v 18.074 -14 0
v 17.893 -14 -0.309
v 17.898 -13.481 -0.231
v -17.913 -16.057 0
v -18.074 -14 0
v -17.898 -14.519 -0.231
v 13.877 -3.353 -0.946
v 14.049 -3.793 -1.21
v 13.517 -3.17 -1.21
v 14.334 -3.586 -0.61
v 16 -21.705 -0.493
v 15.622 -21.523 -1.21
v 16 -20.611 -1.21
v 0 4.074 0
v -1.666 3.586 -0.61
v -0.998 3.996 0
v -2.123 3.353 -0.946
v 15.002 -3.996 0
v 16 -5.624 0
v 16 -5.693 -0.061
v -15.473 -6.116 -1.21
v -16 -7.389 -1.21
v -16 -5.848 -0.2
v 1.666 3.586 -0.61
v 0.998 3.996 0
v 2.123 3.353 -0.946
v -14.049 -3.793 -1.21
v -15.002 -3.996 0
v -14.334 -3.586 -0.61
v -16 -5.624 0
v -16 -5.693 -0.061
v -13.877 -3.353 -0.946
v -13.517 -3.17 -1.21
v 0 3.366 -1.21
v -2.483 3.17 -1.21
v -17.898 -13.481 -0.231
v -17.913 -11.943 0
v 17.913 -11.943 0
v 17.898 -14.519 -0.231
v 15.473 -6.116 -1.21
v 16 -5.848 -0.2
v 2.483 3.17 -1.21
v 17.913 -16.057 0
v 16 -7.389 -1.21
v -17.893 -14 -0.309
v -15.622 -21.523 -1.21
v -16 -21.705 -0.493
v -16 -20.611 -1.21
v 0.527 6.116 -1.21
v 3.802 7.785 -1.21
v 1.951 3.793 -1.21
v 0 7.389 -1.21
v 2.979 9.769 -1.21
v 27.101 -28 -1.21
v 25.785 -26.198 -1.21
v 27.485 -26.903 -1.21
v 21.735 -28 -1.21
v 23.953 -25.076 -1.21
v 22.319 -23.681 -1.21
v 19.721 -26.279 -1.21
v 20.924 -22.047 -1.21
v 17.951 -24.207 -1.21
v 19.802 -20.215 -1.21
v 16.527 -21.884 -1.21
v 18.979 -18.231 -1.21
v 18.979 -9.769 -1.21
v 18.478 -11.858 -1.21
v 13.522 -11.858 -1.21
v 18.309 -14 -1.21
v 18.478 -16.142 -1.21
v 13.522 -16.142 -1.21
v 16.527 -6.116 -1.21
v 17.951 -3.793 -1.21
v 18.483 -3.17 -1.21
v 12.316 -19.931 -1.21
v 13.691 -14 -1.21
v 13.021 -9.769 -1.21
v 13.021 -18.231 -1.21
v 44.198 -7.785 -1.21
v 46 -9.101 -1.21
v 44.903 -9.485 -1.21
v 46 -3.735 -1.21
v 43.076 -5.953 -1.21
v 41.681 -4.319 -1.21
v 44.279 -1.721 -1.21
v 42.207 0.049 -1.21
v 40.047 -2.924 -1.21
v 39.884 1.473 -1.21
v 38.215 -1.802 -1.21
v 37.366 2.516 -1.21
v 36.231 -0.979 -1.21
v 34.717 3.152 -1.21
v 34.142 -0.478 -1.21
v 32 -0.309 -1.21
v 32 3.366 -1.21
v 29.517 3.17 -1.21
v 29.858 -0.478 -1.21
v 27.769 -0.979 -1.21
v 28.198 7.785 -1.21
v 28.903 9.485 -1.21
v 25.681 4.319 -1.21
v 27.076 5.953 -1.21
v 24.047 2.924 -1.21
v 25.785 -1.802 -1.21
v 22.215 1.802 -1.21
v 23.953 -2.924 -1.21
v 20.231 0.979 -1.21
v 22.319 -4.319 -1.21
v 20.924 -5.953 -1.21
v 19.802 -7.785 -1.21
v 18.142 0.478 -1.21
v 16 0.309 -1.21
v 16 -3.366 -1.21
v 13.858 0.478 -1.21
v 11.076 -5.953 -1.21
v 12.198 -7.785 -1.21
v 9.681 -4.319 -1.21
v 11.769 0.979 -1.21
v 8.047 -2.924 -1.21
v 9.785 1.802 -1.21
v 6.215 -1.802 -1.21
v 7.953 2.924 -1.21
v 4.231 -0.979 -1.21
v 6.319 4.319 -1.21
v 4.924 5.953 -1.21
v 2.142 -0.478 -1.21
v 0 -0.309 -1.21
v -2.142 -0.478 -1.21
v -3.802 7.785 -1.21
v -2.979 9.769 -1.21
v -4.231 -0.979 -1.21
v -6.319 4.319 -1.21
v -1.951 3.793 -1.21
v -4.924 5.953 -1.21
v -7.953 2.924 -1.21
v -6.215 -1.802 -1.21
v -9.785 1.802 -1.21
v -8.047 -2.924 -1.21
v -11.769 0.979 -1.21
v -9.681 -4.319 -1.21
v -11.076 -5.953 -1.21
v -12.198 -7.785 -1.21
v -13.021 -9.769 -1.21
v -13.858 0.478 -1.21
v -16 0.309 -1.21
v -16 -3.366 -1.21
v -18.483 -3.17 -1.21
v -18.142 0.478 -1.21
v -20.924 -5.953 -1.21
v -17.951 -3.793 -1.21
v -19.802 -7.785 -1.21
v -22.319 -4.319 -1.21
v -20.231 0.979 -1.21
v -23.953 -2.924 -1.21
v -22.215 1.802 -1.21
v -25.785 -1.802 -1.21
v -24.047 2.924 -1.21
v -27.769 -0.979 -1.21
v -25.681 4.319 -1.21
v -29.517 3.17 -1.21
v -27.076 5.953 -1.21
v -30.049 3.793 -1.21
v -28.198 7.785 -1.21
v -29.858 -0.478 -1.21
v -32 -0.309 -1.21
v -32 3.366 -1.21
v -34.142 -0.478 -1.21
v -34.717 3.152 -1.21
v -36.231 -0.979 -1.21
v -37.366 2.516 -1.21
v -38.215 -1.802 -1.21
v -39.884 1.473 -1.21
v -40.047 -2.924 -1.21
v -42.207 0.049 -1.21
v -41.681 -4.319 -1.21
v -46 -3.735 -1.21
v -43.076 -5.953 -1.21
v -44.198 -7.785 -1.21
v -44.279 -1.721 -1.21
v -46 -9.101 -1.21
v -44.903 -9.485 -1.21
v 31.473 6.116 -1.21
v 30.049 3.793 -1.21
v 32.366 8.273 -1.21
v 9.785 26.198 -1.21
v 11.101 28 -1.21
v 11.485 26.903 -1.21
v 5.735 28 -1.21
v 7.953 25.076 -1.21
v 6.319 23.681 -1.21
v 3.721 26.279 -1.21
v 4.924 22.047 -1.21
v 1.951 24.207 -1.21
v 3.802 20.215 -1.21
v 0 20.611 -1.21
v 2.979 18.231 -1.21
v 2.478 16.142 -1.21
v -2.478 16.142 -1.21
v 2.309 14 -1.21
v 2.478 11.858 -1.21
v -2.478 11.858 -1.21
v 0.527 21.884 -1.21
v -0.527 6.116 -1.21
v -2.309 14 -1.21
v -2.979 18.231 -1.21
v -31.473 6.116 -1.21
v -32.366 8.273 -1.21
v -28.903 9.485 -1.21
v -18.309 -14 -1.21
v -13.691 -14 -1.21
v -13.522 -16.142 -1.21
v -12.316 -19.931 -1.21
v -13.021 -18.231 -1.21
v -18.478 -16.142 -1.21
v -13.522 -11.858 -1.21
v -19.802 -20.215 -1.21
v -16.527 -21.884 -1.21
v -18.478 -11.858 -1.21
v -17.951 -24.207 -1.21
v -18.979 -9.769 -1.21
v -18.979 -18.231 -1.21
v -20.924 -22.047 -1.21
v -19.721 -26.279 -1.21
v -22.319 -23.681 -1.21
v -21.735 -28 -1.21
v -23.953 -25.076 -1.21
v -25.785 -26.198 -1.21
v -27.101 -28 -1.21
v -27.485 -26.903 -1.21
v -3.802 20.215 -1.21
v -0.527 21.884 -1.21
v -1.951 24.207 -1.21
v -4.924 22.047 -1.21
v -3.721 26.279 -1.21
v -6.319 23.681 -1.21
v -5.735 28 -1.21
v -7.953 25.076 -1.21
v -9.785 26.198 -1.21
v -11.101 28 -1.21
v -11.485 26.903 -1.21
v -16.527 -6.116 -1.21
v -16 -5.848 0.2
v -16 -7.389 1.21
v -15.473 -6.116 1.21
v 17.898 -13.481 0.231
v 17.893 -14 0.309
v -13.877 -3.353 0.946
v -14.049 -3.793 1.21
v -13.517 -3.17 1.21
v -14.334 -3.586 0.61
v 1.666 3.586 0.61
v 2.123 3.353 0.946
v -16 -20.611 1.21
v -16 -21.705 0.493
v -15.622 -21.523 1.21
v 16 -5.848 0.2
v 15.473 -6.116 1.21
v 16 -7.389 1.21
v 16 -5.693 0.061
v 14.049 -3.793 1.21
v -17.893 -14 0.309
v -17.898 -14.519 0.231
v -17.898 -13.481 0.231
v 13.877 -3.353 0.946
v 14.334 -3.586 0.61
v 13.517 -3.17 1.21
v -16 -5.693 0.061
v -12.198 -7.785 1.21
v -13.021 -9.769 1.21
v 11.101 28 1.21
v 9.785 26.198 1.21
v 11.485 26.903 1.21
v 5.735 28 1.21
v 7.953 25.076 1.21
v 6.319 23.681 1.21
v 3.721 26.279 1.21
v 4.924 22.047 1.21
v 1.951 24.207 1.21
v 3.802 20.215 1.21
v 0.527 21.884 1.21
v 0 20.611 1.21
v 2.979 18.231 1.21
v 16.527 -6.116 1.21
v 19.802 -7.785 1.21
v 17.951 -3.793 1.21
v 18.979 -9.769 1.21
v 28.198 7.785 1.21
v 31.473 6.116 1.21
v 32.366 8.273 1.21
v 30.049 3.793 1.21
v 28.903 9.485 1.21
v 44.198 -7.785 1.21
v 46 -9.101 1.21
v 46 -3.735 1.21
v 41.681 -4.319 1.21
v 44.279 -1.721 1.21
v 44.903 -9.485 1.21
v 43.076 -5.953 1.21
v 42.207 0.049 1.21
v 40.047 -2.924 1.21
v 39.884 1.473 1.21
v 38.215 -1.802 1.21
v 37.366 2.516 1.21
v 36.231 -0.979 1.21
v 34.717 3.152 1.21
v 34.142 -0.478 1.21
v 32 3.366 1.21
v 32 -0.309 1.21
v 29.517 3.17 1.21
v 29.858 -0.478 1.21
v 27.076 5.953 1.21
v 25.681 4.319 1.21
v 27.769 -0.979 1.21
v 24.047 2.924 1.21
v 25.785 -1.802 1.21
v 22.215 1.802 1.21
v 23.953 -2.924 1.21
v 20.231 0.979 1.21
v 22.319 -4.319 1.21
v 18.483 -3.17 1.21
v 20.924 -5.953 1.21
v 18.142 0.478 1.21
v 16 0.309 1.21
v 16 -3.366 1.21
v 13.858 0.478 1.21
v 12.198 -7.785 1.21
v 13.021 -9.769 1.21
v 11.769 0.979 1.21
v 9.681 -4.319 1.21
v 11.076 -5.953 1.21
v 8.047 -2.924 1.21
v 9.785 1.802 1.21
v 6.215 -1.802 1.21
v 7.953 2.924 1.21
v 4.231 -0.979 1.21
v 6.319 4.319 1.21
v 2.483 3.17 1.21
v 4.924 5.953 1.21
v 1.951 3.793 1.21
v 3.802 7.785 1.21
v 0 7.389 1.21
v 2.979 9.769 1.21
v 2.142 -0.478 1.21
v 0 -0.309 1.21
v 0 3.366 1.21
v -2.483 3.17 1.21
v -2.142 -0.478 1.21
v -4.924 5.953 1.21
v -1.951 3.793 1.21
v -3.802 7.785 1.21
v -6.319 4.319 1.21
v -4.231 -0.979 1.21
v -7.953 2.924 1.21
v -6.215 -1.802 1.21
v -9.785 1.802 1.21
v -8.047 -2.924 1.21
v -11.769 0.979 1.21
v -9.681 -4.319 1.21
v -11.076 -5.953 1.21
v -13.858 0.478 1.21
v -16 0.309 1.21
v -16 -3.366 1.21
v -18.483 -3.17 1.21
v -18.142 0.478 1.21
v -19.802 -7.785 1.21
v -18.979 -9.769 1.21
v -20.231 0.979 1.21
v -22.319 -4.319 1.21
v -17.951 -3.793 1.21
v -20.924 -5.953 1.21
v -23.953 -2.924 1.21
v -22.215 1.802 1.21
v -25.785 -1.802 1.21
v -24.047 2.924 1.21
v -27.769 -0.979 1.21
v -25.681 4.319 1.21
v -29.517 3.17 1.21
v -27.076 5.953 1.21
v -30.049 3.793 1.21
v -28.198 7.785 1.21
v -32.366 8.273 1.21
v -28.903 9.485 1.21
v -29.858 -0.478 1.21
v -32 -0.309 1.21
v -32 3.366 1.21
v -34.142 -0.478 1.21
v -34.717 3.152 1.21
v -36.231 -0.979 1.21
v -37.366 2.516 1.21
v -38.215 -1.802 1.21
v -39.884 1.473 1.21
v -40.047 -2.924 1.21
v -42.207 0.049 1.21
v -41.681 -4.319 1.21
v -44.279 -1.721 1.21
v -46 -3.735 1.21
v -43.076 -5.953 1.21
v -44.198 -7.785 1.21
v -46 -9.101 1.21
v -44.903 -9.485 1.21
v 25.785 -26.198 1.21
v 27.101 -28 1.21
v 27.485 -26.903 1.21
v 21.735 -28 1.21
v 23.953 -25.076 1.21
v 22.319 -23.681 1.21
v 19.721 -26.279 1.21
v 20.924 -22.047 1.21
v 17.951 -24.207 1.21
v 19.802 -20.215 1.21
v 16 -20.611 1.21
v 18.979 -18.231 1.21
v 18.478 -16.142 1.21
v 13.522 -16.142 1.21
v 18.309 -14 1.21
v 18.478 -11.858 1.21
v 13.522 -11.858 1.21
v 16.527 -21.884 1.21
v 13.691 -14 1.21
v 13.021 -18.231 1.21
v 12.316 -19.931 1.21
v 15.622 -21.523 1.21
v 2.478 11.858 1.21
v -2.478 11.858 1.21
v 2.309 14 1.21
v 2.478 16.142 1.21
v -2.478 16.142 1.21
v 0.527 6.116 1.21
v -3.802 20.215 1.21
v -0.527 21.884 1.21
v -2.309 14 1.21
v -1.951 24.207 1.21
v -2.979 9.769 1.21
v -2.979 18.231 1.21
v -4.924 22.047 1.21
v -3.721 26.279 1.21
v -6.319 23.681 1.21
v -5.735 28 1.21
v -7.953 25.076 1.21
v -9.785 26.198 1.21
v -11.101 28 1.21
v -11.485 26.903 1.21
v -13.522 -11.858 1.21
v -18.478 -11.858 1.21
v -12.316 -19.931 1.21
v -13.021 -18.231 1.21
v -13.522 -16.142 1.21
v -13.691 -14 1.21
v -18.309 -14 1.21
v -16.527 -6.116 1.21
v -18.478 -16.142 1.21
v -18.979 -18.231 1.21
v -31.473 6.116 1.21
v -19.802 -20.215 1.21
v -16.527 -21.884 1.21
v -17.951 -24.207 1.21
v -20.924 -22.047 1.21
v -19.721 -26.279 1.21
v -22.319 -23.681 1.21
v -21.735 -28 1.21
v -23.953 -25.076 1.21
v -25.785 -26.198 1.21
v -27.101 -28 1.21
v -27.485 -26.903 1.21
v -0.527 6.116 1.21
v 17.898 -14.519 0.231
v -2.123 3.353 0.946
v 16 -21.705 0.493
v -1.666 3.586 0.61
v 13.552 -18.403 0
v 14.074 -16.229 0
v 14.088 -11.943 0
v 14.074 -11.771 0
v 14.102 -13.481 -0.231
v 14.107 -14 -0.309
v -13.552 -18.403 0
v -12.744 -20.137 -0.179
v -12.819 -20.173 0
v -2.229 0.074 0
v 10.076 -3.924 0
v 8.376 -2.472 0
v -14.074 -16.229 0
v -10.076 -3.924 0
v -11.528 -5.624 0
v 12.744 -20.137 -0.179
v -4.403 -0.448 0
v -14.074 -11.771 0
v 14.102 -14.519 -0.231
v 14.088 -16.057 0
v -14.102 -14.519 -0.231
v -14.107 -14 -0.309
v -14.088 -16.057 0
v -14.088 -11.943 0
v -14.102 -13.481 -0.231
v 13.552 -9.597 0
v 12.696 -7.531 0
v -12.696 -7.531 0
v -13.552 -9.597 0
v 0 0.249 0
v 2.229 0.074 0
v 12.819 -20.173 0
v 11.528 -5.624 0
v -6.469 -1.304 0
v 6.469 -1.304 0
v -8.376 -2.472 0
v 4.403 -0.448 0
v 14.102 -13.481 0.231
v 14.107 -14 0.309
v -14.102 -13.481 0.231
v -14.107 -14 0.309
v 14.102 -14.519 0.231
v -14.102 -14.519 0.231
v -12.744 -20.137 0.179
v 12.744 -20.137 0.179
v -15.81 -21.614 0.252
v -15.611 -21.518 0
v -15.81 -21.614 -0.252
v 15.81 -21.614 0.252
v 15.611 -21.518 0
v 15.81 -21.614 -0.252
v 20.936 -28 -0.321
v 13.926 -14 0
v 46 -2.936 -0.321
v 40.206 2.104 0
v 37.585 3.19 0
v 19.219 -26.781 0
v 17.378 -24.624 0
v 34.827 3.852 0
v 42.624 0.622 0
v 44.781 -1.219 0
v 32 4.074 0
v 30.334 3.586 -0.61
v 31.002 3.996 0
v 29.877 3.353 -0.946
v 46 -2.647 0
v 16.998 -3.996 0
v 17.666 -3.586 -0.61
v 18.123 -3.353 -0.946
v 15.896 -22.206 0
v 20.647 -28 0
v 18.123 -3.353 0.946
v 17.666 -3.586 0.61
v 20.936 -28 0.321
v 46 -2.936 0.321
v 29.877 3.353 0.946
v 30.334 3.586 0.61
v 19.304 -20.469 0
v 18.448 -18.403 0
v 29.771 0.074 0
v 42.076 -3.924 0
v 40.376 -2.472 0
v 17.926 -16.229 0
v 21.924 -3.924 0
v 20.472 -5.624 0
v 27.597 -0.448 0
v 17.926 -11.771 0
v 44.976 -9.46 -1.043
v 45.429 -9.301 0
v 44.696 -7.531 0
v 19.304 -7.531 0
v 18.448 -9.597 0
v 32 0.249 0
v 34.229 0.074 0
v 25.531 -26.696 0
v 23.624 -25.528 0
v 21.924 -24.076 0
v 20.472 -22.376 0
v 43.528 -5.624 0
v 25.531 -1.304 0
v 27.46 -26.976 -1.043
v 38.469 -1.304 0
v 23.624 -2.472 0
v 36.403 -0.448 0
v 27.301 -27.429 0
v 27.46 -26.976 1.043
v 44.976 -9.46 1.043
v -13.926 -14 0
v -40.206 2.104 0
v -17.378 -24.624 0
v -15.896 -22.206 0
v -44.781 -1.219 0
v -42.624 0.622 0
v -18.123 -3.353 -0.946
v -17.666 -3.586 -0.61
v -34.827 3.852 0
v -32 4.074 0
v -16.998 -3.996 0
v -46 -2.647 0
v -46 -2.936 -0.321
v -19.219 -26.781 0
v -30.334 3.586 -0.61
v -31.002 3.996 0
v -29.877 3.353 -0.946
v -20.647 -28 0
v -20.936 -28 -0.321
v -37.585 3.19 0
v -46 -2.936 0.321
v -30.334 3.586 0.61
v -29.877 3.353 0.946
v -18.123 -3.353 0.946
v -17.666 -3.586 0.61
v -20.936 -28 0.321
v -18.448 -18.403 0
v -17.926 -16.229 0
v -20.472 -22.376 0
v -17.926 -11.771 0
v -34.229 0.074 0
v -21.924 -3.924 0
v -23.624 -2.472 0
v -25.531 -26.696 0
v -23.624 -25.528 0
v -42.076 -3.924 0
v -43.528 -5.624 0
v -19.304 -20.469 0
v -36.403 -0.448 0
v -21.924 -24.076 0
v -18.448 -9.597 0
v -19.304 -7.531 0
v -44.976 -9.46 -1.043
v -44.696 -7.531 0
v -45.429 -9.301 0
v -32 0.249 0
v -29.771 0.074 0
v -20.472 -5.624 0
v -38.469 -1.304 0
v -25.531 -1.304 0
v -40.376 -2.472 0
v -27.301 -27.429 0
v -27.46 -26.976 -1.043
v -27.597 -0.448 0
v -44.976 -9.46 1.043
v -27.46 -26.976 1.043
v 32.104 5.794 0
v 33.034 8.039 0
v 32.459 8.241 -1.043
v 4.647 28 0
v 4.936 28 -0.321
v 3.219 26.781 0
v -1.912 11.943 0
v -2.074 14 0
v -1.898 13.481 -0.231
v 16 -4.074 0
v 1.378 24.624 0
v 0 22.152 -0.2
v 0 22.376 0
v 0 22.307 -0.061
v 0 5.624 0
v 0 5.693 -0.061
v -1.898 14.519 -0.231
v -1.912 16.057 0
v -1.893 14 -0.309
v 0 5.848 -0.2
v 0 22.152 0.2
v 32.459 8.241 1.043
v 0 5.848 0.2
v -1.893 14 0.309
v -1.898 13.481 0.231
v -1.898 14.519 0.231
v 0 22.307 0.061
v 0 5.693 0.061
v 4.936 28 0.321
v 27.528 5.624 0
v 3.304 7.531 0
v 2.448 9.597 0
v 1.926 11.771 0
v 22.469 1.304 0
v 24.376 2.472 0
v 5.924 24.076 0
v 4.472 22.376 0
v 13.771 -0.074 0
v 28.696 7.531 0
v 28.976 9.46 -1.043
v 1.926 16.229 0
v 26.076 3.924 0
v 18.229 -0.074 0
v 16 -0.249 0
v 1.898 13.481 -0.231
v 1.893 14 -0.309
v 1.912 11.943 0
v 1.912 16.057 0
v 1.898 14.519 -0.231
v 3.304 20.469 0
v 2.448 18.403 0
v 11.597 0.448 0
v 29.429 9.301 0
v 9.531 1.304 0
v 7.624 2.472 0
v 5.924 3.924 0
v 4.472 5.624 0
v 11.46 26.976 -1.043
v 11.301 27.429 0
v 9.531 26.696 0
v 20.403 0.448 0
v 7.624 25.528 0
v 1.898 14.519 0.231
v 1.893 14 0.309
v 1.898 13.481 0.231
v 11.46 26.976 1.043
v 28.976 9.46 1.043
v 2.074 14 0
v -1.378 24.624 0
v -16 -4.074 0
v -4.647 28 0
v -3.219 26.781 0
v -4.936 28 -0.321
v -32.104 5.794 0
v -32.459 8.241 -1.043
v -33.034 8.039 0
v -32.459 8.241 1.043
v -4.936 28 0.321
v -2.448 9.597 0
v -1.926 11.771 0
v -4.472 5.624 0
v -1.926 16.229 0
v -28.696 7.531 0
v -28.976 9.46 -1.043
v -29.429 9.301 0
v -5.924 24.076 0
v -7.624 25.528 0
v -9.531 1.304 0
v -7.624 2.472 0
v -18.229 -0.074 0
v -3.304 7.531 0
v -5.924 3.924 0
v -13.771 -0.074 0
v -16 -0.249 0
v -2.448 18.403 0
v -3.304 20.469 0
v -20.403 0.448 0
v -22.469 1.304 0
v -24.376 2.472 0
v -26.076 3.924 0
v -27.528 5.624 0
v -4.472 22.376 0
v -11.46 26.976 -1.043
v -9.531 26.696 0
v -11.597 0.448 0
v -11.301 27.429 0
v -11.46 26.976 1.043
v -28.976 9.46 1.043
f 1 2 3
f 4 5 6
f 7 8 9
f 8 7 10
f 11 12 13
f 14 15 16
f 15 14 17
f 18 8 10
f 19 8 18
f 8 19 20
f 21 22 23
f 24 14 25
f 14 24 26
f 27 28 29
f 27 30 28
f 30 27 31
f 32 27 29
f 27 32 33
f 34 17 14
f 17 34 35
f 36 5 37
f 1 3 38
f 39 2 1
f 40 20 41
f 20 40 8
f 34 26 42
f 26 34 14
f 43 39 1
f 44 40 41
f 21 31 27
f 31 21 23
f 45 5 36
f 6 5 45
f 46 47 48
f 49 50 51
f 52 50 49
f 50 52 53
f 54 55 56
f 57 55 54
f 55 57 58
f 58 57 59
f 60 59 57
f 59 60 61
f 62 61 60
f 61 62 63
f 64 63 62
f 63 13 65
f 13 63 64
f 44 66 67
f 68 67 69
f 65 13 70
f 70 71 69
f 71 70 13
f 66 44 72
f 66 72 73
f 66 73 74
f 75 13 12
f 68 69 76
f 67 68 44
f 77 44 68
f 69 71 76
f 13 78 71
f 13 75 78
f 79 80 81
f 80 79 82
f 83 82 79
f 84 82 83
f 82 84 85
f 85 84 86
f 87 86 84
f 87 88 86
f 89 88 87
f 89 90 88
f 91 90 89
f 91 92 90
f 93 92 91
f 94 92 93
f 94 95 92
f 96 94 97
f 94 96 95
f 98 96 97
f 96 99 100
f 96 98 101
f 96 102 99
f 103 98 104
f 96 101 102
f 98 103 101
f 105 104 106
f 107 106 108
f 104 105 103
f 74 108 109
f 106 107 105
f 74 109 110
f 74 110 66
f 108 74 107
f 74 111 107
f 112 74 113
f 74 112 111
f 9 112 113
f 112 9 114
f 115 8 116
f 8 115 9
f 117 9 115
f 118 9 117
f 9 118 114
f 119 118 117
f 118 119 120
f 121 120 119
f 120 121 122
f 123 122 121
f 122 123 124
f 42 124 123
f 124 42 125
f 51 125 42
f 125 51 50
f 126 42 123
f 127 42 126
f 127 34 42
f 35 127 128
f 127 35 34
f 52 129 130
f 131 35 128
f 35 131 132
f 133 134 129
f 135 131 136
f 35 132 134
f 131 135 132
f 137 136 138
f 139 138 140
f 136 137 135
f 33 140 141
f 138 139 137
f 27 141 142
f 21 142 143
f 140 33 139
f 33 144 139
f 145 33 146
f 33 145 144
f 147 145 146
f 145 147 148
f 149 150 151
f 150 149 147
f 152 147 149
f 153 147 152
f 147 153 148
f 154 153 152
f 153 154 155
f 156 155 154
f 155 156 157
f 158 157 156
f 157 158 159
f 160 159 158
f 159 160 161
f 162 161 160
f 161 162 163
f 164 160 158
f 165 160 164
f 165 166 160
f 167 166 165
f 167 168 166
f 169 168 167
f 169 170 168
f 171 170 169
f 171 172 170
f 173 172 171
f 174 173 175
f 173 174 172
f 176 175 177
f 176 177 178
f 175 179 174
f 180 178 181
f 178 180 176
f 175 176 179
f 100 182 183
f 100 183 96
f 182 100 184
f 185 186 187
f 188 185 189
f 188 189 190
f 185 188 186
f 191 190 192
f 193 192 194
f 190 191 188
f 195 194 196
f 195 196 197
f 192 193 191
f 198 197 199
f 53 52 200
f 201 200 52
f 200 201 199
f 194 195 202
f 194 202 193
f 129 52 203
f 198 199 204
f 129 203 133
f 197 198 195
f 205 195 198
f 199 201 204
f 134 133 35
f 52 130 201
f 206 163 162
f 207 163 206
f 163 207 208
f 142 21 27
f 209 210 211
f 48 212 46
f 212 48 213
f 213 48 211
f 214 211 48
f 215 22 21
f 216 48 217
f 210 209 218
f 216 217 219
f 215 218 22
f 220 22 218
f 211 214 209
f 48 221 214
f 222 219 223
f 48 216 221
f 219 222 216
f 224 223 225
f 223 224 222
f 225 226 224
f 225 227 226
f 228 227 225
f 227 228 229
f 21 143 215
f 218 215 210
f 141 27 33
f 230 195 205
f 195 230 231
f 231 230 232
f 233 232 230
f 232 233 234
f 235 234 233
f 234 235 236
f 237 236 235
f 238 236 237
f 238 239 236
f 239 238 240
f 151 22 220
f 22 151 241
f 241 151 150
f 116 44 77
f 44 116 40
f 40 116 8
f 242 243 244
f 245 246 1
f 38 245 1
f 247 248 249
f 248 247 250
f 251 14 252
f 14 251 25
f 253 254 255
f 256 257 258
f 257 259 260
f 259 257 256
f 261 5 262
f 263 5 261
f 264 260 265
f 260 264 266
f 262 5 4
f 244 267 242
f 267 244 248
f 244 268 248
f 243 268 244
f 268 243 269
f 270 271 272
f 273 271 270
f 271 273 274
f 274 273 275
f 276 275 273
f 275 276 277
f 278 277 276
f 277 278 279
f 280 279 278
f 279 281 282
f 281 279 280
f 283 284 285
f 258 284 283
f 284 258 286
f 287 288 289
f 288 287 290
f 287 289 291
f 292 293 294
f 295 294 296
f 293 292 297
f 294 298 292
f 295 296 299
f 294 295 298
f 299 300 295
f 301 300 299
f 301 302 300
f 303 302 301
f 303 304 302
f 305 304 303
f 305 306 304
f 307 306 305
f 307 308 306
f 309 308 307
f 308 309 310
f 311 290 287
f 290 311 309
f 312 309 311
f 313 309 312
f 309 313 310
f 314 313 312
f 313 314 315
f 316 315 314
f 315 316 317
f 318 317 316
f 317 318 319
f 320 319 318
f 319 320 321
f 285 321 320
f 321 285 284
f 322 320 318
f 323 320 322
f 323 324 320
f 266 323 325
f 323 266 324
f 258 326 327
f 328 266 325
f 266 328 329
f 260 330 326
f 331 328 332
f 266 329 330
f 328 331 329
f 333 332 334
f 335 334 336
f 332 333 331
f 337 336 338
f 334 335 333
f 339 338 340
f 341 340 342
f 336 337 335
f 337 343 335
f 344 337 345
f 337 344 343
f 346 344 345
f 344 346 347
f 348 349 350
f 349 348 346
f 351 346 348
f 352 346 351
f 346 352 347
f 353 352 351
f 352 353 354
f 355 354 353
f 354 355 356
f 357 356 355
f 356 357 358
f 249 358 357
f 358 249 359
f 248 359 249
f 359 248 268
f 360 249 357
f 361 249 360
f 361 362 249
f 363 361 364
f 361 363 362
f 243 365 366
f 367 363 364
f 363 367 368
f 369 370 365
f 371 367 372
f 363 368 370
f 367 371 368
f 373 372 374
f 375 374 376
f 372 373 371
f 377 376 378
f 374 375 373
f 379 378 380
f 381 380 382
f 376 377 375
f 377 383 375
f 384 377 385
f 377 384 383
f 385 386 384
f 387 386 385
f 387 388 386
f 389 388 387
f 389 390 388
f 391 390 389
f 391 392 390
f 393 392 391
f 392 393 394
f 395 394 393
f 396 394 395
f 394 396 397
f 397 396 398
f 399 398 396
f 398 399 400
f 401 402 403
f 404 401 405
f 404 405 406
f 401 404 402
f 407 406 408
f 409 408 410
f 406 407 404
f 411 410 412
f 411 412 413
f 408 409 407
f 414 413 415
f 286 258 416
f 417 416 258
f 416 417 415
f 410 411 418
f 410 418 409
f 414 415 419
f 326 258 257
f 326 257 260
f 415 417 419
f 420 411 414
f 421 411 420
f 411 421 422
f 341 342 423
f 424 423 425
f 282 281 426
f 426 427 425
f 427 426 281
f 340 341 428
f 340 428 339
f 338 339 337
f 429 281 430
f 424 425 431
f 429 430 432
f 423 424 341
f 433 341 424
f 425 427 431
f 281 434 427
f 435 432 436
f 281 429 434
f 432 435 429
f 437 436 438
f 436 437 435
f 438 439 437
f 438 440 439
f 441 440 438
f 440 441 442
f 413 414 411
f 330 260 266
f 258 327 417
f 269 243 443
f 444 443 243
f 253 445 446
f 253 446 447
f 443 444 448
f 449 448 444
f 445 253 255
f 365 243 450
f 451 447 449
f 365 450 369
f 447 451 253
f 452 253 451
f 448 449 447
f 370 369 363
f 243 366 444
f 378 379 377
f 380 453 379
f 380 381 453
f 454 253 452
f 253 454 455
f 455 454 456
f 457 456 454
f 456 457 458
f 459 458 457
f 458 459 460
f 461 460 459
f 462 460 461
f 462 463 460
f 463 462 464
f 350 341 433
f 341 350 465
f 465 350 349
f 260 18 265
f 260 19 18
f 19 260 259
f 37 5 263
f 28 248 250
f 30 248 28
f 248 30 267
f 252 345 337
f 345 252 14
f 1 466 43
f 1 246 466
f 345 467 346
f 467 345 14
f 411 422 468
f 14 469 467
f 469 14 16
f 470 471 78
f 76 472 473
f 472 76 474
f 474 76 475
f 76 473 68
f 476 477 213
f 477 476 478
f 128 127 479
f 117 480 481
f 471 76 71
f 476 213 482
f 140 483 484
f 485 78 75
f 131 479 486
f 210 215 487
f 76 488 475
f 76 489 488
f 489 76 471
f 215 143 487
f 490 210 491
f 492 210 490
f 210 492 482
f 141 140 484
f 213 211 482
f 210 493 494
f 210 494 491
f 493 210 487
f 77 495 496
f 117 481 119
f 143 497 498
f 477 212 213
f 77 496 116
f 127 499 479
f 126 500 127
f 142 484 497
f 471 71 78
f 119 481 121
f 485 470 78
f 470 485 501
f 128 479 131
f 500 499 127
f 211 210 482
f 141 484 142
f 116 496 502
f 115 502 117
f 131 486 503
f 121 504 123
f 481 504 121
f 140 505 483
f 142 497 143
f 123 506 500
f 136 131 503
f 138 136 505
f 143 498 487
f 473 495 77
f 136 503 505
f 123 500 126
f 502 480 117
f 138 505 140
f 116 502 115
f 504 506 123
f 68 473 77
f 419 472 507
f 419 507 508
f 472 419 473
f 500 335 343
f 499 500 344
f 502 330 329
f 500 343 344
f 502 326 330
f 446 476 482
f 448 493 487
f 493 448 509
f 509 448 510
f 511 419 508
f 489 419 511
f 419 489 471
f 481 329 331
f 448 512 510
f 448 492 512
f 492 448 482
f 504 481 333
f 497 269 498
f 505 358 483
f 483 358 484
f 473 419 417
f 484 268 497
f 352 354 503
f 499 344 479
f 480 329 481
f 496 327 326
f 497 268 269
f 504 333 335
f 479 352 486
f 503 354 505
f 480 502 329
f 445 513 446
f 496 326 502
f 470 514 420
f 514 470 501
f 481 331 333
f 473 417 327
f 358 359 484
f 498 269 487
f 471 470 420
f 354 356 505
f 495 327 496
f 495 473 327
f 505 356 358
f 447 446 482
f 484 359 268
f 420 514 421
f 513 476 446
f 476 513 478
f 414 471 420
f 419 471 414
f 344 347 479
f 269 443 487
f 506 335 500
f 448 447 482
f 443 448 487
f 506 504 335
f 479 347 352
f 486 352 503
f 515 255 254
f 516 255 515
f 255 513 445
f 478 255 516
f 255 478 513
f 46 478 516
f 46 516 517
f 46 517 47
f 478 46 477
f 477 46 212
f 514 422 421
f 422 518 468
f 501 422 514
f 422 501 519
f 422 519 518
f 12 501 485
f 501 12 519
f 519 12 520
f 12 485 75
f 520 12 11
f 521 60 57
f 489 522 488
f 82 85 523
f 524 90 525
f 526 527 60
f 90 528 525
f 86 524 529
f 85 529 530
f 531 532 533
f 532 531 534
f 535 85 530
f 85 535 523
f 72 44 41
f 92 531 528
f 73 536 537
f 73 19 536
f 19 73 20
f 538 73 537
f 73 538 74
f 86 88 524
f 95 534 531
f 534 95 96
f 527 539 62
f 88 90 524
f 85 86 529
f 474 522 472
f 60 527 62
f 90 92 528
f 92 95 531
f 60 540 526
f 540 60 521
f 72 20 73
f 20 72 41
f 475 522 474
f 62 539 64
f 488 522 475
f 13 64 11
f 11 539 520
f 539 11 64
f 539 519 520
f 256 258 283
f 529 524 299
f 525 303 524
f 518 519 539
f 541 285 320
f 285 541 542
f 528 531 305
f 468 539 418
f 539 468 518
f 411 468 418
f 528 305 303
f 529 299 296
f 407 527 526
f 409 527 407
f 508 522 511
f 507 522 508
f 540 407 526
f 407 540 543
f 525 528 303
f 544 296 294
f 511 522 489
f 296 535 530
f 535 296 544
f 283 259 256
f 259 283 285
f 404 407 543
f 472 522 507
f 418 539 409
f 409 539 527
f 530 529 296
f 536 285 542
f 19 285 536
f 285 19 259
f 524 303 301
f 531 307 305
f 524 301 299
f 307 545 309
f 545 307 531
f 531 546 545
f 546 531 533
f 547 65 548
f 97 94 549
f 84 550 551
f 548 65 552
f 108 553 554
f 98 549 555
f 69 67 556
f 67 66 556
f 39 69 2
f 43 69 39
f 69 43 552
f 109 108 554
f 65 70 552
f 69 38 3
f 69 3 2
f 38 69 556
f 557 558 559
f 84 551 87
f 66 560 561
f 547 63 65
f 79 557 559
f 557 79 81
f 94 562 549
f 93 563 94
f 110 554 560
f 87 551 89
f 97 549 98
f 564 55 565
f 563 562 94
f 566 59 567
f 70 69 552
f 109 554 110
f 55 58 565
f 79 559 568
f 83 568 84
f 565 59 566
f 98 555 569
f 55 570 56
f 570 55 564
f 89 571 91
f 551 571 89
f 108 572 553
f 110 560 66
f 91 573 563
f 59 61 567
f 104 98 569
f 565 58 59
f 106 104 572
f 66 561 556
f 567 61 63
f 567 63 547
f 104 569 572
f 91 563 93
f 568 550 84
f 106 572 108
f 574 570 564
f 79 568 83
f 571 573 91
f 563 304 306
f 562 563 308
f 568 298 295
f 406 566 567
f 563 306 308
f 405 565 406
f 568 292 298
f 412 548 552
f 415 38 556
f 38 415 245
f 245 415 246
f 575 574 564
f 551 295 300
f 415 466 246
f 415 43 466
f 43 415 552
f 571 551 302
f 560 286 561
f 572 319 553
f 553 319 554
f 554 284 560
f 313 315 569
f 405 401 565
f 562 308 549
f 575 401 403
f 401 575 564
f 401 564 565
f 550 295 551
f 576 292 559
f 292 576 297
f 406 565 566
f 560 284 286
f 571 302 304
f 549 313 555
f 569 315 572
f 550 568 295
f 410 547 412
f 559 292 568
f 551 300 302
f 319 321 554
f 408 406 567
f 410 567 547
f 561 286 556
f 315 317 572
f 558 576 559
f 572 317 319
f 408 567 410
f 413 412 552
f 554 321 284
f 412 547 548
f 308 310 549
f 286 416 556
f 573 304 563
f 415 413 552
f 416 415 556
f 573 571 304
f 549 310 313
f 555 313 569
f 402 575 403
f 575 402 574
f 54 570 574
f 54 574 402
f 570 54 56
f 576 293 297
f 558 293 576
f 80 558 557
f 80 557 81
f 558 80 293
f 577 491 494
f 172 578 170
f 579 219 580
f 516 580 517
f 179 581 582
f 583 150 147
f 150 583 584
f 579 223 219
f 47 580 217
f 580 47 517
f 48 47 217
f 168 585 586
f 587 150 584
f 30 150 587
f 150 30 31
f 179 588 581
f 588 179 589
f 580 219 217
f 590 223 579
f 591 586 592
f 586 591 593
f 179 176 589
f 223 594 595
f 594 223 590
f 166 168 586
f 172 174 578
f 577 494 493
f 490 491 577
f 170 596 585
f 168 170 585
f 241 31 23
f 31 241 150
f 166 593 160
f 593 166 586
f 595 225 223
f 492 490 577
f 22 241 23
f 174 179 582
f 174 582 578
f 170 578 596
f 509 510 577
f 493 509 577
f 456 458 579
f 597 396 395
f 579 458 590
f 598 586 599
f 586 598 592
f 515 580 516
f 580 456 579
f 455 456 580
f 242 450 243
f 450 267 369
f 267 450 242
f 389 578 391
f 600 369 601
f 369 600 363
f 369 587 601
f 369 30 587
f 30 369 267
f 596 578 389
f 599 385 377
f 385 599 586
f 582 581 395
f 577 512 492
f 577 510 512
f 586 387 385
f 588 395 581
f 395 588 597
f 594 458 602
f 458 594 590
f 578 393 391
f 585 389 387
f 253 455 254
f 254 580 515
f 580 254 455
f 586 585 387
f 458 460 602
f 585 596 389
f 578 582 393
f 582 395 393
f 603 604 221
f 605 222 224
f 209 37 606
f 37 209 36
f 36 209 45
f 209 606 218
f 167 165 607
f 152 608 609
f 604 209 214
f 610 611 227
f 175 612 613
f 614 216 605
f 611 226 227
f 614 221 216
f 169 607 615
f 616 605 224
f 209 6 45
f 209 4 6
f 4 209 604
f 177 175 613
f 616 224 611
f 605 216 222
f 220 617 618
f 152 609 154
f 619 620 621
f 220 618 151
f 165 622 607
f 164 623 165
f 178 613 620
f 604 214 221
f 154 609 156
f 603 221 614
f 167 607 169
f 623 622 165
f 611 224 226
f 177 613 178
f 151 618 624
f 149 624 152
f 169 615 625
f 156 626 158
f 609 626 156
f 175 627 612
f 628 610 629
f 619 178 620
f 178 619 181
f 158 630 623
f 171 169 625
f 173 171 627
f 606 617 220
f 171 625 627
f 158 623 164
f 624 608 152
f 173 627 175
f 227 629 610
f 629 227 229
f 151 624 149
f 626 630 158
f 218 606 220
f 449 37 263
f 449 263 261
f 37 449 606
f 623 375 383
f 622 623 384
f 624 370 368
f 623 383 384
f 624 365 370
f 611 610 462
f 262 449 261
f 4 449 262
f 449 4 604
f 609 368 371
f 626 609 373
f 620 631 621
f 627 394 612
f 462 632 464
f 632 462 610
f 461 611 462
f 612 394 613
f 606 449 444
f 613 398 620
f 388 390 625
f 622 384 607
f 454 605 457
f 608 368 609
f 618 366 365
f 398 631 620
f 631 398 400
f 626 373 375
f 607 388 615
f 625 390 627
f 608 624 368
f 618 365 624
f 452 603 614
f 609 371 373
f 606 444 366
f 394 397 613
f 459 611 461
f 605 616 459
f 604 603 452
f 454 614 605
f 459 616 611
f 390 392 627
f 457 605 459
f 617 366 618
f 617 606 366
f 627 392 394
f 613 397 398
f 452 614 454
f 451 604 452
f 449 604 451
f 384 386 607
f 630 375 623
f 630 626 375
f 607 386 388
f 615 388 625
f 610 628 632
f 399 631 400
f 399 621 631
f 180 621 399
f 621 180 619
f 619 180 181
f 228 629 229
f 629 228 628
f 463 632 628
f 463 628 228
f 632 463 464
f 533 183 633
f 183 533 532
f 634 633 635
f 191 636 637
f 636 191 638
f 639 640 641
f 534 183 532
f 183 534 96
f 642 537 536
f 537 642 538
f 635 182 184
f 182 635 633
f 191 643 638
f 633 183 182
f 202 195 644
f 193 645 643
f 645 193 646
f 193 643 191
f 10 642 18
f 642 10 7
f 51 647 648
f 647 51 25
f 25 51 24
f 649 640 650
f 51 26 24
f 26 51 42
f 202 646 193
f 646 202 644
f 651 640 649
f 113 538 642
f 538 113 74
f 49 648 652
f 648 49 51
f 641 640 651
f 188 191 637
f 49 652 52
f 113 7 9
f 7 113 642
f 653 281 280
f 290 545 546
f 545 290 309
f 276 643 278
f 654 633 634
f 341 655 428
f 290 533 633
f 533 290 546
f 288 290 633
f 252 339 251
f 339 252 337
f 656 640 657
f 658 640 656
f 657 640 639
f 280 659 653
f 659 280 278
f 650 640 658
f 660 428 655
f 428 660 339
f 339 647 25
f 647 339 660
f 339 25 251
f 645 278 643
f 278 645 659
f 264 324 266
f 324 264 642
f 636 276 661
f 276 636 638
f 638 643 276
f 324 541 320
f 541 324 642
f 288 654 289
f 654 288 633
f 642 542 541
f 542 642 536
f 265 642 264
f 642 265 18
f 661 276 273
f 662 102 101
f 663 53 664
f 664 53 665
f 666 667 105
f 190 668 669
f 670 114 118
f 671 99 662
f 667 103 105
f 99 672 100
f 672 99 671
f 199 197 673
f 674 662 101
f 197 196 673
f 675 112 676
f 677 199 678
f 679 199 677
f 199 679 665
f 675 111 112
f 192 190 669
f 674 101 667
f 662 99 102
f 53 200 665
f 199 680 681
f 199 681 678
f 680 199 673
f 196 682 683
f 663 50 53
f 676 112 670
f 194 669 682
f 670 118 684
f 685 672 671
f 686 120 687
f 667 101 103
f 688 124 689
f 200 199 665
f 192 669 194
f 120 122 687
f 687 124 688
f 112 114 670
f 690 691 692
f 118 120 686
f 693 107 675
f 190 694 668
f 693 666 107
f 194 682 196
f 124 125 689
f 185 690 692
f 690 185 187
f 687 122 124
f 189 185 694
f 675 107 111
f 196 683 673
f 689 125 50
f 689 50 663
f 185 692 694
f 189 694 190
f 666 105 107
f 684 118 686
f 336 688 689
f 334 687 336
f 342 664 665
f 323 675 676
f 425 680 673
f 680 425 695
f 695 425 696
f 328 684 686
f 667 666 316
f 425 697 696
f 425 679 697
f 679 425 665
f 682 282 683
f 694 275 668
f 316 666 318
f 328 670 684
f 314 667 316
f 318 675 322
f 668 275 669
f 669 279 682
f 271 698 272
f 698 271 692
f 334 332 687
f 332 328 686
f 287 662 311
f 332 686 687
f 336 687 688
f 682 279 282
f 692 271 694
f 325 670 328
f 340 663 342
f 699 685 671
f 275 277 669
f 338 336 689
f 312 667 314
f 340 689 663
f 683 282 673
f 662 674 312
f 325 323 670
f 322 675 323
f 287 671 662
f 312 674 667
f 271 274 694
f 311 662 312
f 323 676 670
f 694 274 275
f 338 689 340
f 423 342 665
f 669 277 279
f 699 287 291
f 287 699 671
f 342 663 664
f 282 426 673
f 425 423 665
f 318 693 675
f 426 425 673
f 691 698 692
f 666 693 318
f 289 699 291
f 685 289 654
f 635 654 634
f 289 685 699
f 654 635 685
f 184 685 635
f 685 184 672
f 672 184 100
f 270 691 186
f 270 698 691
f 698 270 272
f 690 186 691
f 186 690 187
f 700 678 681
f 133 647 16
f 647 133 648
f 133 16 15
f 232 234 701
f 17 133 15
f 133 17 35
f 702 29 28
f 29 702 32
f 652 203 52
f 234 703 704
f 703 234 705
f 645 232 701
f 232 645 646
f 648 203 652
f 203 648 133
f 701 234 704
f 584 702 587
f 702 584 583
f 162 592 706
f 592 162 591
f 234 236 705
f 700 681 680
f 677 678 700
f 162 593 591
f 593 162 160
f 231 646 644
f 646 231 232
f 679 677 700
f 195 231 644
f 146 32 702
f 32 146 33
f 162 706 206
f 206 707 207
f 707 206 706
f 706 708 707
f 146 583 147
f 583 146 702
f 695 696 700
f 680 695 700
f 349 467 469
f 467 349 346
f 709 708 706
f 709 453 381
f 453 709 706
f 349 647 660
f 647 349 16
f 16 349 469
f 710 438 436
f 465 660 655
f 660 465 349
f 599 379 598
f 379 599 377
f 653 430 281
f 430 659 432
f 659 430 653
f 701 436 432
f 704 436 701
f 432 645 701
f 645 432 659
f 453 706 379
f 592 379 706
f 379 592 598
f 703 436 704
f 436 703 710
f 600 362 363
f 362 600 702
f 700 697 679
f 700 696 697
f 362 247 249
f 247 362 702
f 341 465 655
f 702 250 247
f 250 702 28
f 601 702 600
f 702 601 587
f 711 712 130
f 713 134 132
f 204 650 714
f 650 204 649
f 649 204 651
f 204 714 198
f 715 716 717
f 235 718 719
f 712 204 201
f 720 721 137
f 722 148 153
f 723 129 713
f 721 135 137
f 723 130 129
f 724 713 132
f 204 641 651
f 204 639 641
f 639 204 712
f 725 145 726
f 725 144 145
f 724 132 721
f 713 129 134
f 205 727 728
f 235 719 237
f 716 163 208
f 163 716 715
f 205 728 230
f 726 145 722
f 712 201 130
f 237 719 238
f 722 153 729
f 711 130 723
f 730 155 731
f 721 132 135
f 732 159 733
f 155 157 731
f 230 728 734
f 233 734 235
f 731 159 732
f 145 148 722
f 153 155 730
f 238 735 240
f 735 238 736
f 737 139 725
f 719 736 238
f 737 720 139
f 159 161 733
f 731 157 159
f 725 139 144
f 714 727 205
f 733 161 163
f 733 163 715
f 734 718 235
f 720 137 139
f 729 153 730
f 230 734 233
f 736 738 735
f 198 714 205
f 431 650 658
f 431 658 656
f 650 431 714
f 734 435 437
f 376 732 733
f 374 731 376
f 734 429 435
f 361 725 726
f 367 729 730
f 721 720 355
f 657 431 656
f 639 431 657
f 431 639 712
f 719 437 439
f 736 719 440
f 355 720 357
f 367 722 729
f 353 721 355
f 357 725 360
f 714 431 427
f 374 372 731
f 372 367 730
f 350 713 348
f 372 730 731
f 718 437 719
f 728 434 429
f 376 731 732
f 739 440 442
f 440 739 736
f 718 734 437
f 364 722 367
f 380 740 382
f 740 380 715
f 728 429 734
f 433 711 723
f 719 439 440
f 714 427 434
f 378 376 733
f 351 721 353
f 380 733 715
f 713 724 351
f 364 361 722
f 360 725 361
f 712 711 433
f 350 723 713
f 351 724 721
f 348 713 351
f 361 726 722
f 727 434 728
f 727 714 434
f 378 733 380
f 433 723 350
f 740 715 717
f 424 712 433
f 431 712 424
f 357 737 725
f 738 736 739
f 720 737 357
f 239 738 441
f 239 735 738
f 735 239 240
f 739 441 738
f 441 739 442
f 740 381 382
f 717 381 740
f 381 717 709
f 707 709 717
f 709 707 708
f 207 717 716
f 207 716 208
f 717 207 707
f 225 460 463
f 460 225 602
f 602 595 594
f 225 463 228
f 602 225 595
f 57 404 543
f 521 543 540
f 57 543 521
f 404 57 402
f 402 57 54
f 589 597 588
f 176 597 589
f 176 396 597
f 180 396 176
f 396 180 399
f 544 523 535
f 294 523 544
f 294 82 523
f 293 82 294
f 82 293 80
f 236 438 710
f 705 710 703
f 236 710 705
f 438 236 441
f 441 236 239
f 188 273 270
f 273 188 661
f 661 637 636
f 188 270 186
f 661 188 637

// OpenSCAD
Length=92; //Credit Card Size
Width=56; //Credit Card Size
NDia=21.19; //Canadian Nickle Diameter
NThick=1.81; //Canadian Nickle Thickness
DDia=18.01; //Canadian Dime Thickness
DThick=1.19; //Canadian Dime Thickness
QDia=23.88; //Canadian Quarter Thickness
QThick=1.58; //Canadian Quarter Thickness
LDia=26.48; //Canadian Loonie Diameter
LThick=1.92; //Candian Loonie Thickness
TDia=27.94; //Candian Toonie Diameter
TThick=1.67; //Candian Toonie Thickness
WallWidth=3.75; //Hub Thickness for flexibimty and strength
Thickness=LThick+0.5; //0.5mm thicker than thickest coin
$fn=40;


module CoinHole(Diameter){
	translate([0,0,-Thickness/2])cylinder(r1=Diameter*0.49,r2=Diameter*.51,h=Thickness/2);
	translate([0,0,0])cylinder(r1=Diameter*0.51,r2=Diameter*.49,h=Thickness/2);
	cylinder(r=Diameter*.49,h=Thickness*2,center=true);
}
module OutCoinHole(Diameter){
	translate([0,0,-Thickness/2])cylinder(r1=Diameter*0.49,r2=Diameter*.51,h=Thickness/2);
	translate([0,0,0])cylinder(r1=Diameter*0.51,r2=Diameter*.49,h=Thickness/2);
	//cylinder(r=Diameter*.49,h=Thickness*2,center=true);
}
module CutOut(Size){
	translate([-Size,0,-Thickness])cylinder(r=Size,h=Thickness*2,$fn=7,center=false);
}
module CoinCircle(XLoc,YLoc,Diameter,Rot){
	difference(){
		translate([XLoc,YLoc,0])OutCoinHole(Diameter+WallWidth*2); //Outside Circle
		translate([XLoc,YLoc,0])CoinHole(Diameter); //Inside Circle
		translate([XLoc,YLoc,0])rotate(a=[0,0,Rot])CutOut(Diameter); //Stress Notch
	}
}

intersection(){
	union(){
		CoinCircle(0,-14,TDia,90); //Loonie 1
		CoinCircle(32,-14,TDia,135); //Loonie 2
		CoinCircle(-32,-14,TDia,45); //Loonie 3
		CoinCircle(16,14,TDia,-135); //Loonie 4
		CoinCircle(-16,14,TDia,-45); //Loonie 5
	}
	minkowski(){
			cube([Length-4,Width-4,Thickness],center=true);
			cylinder(r=2,h=Thickness/2,center=true);
	}
}
